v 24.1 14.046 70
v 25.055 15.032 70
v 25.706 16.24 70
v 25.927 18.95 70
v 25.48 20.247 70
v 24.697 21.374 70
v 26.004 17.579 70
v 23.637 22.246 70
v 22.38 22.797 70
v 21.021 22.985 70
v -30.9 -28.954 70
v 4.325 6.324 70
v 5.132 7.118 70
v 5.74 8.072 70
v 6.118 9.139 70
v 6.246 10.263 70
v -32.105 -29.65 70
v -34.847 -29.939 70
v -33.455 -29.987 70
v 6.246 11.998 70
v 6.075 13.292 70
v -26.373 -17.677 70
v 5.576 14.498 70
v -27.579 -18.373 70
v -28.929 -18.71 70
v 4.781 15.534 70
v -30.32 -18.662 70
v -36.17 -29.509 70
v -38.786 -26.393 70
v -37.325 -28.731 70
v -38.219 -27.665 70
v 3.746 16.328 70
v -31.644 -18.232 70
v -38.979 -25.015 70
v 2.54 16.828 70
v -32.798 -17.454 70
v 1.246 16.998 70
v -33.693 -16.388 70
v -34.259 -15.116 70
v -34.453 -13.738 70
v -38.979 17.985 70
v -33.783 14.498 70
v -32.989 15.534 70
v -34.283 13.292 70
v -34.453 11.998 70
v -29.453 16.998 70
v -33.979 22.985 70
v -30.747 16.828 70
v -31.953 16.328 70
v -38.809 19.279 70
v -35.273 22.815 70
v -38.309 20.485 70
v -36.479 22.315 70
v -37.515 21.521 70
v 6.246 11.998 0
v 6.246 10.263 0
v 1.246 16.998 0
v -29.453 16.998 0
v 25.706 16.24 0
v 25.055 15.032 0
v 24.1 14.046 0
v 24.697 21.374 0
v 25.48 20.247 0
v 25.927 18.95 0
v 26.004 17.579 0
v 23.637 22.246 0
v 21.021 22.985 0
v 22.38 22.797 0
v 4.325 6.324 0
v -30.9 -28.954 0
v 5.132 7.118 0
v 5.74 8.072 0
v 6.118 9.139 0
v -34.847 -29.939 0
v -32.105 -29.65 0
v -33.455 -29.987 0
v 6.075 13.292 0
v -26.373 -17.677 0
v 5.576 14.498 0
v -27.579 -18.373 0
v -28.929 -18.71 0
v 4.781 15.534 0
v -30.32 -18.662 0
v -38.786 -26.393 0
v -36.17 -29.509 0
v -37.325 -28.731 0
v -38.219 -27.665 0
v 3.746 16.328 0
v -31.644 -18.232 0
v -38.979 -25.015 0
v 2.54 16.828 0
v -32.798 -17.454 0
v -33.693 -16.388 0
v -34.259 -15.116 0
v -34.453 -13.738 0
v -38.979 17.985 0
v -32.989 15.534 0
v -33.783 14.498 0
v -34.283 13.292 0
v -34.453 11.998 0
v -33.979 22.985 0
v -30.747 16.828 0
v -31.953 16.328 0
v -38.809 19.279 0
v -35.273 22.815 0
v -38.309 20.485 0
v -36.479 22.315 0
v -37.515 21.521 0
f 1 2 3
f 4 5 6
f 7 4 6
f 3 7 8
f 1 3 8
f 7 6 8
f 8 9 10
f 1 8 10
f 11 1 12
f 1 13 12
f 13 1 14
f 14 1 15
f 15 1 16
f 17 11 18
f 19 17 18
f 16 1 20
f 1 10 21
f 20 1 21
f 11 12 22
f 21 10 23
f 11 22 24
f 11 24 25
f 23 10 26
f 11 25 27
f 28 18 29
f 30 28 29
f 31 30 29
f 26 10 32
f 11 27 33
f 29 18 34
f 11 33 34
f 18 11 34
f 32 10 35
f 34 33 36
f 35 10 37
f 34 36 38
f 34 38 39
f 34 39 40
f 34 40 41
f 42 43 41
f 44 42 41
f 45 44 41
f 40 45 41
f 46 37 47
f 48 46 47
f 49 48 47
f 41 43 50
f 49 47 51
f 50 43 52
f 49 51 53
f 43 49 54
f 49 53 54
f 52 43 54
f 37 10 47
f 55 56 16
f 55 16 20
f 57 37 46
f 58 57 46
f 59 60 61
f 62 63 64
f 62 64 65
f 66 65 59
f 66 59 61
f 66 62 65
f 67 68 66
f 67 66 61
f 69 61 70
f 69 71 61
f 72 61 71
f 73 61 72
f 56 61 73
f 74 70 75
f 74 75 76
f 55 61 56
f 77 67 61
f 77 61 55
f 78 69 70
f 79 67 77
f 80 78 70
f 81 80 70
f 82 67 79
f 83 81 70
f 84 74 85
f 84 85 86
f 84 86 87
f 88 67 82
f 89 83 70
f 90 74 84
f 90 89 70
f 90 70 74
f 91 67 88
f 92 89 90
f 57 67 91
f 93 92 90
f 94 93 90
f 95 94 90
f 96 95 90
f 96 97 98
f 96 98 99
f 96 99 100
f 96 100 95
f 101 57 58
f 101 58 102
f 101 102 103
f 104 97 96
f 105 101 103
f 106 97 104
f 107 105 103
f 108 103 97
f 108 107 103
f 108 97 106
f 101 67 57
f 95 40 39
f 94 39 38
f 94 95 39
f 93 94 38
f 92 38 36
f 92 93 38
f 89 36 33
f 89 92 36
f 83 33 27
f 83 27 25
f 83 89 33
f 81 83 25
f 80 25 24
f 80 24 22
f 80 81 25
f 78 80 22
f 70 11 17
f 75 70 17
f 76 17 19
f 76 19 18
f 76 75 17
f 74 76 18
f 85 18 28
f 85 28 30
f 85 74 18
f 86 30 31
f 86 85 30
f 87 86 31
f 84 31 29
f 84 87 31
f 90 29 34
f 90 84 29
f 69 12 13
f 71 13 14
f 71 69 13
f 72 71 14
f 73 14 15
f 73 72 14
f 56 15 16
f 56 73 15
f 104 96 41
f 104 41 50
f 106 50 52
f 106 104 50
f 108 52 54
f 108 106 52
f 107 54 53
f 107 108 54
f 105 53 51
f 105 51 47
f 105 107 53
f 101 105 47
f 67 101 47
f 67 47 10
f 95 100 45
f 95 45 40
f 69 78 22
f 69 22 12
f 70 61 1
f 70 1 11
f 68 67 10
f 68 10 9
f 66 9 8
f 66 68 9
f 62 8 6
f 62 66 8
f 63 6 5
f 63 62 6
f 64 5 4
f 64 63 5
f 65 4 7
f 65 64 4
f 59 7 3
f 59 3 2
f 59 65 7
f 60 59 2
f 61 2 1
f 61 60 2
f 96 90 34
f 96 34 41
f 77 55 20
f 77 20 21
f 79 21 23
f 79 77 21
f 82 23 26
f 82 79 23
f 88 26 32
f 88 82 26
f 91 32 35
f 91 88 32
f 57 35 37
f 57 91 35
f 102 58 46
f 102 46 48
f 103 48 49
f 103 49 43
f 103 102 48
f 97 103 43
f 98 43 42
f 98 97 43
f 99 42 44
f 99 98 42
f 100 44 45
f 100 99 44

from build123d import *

# Parameters (mm, degrees)
BOSS_EXTRUDE1_DEPTH = 70


with BuildPart() as part:
    # Sketch2 → Boss-Extrude1 (new body)
    with BuildSketch(Plane.XY):
        with BuildLine():
            ThreePointArc((21.020681104, 22.985087501), (25.748004826, 19.613709748), (24.100290936, 14.04605167))
            Line((24.100290936, 14.04605167), (-30.899709064, -28.95394833))
            ThreePointArc((-30.899709064, -28.95394833), (-36.170431723, -29.509244994), (-38.979318896, -25.014912499))
            Line((-38.979318896, -25.014912499), (-38.979318896, 17.985087501))
            ThreePointArc((-38.979318896, 17.985087501), (-37.514852802, 21.520621407), (-33.979318896, 22.985087501))
            Line((-33.979318896, 22.985087501), (21.020681104, 22.985087501))
        make_face()
        with BuildLine():
            ThreePointArc((6.245861273, 11.998107897), (4.781395179, 15.533641803), (1.245861273, 16.998107897))
            Line((1.245861273, 16.998107897), (-29.453101677, 16.998107897))
            ThreePointArc((-29.453101677, 16.998107897), (-32.988635583, 15.533641803), (-34.453101677, 11.998107897))
            Line((-34.453101677, 11.998107897), (-34.453101677, -13.737840514))
            ThreePointArc((-34.453101677, -13.737840514), (-31.644214504, -18.232173009), (-26.373491845, -17.676876345))
            Line((-26.373491845, -17.676876345), (4.325471105, 6.324131052))
            ThreePointArc((4.325471105, 6.324131052), (5.740193768, 8.072054056), (6.245861273, 10.263166883))
            Line((6.245861273, 10.263166883), (6.245861273, 11.998107897))
        make_face(mode=Mode.SUBTRACT)
    extrude(amount=BOSS_EXTRUDE1_DEPTH)


solid = part.part
